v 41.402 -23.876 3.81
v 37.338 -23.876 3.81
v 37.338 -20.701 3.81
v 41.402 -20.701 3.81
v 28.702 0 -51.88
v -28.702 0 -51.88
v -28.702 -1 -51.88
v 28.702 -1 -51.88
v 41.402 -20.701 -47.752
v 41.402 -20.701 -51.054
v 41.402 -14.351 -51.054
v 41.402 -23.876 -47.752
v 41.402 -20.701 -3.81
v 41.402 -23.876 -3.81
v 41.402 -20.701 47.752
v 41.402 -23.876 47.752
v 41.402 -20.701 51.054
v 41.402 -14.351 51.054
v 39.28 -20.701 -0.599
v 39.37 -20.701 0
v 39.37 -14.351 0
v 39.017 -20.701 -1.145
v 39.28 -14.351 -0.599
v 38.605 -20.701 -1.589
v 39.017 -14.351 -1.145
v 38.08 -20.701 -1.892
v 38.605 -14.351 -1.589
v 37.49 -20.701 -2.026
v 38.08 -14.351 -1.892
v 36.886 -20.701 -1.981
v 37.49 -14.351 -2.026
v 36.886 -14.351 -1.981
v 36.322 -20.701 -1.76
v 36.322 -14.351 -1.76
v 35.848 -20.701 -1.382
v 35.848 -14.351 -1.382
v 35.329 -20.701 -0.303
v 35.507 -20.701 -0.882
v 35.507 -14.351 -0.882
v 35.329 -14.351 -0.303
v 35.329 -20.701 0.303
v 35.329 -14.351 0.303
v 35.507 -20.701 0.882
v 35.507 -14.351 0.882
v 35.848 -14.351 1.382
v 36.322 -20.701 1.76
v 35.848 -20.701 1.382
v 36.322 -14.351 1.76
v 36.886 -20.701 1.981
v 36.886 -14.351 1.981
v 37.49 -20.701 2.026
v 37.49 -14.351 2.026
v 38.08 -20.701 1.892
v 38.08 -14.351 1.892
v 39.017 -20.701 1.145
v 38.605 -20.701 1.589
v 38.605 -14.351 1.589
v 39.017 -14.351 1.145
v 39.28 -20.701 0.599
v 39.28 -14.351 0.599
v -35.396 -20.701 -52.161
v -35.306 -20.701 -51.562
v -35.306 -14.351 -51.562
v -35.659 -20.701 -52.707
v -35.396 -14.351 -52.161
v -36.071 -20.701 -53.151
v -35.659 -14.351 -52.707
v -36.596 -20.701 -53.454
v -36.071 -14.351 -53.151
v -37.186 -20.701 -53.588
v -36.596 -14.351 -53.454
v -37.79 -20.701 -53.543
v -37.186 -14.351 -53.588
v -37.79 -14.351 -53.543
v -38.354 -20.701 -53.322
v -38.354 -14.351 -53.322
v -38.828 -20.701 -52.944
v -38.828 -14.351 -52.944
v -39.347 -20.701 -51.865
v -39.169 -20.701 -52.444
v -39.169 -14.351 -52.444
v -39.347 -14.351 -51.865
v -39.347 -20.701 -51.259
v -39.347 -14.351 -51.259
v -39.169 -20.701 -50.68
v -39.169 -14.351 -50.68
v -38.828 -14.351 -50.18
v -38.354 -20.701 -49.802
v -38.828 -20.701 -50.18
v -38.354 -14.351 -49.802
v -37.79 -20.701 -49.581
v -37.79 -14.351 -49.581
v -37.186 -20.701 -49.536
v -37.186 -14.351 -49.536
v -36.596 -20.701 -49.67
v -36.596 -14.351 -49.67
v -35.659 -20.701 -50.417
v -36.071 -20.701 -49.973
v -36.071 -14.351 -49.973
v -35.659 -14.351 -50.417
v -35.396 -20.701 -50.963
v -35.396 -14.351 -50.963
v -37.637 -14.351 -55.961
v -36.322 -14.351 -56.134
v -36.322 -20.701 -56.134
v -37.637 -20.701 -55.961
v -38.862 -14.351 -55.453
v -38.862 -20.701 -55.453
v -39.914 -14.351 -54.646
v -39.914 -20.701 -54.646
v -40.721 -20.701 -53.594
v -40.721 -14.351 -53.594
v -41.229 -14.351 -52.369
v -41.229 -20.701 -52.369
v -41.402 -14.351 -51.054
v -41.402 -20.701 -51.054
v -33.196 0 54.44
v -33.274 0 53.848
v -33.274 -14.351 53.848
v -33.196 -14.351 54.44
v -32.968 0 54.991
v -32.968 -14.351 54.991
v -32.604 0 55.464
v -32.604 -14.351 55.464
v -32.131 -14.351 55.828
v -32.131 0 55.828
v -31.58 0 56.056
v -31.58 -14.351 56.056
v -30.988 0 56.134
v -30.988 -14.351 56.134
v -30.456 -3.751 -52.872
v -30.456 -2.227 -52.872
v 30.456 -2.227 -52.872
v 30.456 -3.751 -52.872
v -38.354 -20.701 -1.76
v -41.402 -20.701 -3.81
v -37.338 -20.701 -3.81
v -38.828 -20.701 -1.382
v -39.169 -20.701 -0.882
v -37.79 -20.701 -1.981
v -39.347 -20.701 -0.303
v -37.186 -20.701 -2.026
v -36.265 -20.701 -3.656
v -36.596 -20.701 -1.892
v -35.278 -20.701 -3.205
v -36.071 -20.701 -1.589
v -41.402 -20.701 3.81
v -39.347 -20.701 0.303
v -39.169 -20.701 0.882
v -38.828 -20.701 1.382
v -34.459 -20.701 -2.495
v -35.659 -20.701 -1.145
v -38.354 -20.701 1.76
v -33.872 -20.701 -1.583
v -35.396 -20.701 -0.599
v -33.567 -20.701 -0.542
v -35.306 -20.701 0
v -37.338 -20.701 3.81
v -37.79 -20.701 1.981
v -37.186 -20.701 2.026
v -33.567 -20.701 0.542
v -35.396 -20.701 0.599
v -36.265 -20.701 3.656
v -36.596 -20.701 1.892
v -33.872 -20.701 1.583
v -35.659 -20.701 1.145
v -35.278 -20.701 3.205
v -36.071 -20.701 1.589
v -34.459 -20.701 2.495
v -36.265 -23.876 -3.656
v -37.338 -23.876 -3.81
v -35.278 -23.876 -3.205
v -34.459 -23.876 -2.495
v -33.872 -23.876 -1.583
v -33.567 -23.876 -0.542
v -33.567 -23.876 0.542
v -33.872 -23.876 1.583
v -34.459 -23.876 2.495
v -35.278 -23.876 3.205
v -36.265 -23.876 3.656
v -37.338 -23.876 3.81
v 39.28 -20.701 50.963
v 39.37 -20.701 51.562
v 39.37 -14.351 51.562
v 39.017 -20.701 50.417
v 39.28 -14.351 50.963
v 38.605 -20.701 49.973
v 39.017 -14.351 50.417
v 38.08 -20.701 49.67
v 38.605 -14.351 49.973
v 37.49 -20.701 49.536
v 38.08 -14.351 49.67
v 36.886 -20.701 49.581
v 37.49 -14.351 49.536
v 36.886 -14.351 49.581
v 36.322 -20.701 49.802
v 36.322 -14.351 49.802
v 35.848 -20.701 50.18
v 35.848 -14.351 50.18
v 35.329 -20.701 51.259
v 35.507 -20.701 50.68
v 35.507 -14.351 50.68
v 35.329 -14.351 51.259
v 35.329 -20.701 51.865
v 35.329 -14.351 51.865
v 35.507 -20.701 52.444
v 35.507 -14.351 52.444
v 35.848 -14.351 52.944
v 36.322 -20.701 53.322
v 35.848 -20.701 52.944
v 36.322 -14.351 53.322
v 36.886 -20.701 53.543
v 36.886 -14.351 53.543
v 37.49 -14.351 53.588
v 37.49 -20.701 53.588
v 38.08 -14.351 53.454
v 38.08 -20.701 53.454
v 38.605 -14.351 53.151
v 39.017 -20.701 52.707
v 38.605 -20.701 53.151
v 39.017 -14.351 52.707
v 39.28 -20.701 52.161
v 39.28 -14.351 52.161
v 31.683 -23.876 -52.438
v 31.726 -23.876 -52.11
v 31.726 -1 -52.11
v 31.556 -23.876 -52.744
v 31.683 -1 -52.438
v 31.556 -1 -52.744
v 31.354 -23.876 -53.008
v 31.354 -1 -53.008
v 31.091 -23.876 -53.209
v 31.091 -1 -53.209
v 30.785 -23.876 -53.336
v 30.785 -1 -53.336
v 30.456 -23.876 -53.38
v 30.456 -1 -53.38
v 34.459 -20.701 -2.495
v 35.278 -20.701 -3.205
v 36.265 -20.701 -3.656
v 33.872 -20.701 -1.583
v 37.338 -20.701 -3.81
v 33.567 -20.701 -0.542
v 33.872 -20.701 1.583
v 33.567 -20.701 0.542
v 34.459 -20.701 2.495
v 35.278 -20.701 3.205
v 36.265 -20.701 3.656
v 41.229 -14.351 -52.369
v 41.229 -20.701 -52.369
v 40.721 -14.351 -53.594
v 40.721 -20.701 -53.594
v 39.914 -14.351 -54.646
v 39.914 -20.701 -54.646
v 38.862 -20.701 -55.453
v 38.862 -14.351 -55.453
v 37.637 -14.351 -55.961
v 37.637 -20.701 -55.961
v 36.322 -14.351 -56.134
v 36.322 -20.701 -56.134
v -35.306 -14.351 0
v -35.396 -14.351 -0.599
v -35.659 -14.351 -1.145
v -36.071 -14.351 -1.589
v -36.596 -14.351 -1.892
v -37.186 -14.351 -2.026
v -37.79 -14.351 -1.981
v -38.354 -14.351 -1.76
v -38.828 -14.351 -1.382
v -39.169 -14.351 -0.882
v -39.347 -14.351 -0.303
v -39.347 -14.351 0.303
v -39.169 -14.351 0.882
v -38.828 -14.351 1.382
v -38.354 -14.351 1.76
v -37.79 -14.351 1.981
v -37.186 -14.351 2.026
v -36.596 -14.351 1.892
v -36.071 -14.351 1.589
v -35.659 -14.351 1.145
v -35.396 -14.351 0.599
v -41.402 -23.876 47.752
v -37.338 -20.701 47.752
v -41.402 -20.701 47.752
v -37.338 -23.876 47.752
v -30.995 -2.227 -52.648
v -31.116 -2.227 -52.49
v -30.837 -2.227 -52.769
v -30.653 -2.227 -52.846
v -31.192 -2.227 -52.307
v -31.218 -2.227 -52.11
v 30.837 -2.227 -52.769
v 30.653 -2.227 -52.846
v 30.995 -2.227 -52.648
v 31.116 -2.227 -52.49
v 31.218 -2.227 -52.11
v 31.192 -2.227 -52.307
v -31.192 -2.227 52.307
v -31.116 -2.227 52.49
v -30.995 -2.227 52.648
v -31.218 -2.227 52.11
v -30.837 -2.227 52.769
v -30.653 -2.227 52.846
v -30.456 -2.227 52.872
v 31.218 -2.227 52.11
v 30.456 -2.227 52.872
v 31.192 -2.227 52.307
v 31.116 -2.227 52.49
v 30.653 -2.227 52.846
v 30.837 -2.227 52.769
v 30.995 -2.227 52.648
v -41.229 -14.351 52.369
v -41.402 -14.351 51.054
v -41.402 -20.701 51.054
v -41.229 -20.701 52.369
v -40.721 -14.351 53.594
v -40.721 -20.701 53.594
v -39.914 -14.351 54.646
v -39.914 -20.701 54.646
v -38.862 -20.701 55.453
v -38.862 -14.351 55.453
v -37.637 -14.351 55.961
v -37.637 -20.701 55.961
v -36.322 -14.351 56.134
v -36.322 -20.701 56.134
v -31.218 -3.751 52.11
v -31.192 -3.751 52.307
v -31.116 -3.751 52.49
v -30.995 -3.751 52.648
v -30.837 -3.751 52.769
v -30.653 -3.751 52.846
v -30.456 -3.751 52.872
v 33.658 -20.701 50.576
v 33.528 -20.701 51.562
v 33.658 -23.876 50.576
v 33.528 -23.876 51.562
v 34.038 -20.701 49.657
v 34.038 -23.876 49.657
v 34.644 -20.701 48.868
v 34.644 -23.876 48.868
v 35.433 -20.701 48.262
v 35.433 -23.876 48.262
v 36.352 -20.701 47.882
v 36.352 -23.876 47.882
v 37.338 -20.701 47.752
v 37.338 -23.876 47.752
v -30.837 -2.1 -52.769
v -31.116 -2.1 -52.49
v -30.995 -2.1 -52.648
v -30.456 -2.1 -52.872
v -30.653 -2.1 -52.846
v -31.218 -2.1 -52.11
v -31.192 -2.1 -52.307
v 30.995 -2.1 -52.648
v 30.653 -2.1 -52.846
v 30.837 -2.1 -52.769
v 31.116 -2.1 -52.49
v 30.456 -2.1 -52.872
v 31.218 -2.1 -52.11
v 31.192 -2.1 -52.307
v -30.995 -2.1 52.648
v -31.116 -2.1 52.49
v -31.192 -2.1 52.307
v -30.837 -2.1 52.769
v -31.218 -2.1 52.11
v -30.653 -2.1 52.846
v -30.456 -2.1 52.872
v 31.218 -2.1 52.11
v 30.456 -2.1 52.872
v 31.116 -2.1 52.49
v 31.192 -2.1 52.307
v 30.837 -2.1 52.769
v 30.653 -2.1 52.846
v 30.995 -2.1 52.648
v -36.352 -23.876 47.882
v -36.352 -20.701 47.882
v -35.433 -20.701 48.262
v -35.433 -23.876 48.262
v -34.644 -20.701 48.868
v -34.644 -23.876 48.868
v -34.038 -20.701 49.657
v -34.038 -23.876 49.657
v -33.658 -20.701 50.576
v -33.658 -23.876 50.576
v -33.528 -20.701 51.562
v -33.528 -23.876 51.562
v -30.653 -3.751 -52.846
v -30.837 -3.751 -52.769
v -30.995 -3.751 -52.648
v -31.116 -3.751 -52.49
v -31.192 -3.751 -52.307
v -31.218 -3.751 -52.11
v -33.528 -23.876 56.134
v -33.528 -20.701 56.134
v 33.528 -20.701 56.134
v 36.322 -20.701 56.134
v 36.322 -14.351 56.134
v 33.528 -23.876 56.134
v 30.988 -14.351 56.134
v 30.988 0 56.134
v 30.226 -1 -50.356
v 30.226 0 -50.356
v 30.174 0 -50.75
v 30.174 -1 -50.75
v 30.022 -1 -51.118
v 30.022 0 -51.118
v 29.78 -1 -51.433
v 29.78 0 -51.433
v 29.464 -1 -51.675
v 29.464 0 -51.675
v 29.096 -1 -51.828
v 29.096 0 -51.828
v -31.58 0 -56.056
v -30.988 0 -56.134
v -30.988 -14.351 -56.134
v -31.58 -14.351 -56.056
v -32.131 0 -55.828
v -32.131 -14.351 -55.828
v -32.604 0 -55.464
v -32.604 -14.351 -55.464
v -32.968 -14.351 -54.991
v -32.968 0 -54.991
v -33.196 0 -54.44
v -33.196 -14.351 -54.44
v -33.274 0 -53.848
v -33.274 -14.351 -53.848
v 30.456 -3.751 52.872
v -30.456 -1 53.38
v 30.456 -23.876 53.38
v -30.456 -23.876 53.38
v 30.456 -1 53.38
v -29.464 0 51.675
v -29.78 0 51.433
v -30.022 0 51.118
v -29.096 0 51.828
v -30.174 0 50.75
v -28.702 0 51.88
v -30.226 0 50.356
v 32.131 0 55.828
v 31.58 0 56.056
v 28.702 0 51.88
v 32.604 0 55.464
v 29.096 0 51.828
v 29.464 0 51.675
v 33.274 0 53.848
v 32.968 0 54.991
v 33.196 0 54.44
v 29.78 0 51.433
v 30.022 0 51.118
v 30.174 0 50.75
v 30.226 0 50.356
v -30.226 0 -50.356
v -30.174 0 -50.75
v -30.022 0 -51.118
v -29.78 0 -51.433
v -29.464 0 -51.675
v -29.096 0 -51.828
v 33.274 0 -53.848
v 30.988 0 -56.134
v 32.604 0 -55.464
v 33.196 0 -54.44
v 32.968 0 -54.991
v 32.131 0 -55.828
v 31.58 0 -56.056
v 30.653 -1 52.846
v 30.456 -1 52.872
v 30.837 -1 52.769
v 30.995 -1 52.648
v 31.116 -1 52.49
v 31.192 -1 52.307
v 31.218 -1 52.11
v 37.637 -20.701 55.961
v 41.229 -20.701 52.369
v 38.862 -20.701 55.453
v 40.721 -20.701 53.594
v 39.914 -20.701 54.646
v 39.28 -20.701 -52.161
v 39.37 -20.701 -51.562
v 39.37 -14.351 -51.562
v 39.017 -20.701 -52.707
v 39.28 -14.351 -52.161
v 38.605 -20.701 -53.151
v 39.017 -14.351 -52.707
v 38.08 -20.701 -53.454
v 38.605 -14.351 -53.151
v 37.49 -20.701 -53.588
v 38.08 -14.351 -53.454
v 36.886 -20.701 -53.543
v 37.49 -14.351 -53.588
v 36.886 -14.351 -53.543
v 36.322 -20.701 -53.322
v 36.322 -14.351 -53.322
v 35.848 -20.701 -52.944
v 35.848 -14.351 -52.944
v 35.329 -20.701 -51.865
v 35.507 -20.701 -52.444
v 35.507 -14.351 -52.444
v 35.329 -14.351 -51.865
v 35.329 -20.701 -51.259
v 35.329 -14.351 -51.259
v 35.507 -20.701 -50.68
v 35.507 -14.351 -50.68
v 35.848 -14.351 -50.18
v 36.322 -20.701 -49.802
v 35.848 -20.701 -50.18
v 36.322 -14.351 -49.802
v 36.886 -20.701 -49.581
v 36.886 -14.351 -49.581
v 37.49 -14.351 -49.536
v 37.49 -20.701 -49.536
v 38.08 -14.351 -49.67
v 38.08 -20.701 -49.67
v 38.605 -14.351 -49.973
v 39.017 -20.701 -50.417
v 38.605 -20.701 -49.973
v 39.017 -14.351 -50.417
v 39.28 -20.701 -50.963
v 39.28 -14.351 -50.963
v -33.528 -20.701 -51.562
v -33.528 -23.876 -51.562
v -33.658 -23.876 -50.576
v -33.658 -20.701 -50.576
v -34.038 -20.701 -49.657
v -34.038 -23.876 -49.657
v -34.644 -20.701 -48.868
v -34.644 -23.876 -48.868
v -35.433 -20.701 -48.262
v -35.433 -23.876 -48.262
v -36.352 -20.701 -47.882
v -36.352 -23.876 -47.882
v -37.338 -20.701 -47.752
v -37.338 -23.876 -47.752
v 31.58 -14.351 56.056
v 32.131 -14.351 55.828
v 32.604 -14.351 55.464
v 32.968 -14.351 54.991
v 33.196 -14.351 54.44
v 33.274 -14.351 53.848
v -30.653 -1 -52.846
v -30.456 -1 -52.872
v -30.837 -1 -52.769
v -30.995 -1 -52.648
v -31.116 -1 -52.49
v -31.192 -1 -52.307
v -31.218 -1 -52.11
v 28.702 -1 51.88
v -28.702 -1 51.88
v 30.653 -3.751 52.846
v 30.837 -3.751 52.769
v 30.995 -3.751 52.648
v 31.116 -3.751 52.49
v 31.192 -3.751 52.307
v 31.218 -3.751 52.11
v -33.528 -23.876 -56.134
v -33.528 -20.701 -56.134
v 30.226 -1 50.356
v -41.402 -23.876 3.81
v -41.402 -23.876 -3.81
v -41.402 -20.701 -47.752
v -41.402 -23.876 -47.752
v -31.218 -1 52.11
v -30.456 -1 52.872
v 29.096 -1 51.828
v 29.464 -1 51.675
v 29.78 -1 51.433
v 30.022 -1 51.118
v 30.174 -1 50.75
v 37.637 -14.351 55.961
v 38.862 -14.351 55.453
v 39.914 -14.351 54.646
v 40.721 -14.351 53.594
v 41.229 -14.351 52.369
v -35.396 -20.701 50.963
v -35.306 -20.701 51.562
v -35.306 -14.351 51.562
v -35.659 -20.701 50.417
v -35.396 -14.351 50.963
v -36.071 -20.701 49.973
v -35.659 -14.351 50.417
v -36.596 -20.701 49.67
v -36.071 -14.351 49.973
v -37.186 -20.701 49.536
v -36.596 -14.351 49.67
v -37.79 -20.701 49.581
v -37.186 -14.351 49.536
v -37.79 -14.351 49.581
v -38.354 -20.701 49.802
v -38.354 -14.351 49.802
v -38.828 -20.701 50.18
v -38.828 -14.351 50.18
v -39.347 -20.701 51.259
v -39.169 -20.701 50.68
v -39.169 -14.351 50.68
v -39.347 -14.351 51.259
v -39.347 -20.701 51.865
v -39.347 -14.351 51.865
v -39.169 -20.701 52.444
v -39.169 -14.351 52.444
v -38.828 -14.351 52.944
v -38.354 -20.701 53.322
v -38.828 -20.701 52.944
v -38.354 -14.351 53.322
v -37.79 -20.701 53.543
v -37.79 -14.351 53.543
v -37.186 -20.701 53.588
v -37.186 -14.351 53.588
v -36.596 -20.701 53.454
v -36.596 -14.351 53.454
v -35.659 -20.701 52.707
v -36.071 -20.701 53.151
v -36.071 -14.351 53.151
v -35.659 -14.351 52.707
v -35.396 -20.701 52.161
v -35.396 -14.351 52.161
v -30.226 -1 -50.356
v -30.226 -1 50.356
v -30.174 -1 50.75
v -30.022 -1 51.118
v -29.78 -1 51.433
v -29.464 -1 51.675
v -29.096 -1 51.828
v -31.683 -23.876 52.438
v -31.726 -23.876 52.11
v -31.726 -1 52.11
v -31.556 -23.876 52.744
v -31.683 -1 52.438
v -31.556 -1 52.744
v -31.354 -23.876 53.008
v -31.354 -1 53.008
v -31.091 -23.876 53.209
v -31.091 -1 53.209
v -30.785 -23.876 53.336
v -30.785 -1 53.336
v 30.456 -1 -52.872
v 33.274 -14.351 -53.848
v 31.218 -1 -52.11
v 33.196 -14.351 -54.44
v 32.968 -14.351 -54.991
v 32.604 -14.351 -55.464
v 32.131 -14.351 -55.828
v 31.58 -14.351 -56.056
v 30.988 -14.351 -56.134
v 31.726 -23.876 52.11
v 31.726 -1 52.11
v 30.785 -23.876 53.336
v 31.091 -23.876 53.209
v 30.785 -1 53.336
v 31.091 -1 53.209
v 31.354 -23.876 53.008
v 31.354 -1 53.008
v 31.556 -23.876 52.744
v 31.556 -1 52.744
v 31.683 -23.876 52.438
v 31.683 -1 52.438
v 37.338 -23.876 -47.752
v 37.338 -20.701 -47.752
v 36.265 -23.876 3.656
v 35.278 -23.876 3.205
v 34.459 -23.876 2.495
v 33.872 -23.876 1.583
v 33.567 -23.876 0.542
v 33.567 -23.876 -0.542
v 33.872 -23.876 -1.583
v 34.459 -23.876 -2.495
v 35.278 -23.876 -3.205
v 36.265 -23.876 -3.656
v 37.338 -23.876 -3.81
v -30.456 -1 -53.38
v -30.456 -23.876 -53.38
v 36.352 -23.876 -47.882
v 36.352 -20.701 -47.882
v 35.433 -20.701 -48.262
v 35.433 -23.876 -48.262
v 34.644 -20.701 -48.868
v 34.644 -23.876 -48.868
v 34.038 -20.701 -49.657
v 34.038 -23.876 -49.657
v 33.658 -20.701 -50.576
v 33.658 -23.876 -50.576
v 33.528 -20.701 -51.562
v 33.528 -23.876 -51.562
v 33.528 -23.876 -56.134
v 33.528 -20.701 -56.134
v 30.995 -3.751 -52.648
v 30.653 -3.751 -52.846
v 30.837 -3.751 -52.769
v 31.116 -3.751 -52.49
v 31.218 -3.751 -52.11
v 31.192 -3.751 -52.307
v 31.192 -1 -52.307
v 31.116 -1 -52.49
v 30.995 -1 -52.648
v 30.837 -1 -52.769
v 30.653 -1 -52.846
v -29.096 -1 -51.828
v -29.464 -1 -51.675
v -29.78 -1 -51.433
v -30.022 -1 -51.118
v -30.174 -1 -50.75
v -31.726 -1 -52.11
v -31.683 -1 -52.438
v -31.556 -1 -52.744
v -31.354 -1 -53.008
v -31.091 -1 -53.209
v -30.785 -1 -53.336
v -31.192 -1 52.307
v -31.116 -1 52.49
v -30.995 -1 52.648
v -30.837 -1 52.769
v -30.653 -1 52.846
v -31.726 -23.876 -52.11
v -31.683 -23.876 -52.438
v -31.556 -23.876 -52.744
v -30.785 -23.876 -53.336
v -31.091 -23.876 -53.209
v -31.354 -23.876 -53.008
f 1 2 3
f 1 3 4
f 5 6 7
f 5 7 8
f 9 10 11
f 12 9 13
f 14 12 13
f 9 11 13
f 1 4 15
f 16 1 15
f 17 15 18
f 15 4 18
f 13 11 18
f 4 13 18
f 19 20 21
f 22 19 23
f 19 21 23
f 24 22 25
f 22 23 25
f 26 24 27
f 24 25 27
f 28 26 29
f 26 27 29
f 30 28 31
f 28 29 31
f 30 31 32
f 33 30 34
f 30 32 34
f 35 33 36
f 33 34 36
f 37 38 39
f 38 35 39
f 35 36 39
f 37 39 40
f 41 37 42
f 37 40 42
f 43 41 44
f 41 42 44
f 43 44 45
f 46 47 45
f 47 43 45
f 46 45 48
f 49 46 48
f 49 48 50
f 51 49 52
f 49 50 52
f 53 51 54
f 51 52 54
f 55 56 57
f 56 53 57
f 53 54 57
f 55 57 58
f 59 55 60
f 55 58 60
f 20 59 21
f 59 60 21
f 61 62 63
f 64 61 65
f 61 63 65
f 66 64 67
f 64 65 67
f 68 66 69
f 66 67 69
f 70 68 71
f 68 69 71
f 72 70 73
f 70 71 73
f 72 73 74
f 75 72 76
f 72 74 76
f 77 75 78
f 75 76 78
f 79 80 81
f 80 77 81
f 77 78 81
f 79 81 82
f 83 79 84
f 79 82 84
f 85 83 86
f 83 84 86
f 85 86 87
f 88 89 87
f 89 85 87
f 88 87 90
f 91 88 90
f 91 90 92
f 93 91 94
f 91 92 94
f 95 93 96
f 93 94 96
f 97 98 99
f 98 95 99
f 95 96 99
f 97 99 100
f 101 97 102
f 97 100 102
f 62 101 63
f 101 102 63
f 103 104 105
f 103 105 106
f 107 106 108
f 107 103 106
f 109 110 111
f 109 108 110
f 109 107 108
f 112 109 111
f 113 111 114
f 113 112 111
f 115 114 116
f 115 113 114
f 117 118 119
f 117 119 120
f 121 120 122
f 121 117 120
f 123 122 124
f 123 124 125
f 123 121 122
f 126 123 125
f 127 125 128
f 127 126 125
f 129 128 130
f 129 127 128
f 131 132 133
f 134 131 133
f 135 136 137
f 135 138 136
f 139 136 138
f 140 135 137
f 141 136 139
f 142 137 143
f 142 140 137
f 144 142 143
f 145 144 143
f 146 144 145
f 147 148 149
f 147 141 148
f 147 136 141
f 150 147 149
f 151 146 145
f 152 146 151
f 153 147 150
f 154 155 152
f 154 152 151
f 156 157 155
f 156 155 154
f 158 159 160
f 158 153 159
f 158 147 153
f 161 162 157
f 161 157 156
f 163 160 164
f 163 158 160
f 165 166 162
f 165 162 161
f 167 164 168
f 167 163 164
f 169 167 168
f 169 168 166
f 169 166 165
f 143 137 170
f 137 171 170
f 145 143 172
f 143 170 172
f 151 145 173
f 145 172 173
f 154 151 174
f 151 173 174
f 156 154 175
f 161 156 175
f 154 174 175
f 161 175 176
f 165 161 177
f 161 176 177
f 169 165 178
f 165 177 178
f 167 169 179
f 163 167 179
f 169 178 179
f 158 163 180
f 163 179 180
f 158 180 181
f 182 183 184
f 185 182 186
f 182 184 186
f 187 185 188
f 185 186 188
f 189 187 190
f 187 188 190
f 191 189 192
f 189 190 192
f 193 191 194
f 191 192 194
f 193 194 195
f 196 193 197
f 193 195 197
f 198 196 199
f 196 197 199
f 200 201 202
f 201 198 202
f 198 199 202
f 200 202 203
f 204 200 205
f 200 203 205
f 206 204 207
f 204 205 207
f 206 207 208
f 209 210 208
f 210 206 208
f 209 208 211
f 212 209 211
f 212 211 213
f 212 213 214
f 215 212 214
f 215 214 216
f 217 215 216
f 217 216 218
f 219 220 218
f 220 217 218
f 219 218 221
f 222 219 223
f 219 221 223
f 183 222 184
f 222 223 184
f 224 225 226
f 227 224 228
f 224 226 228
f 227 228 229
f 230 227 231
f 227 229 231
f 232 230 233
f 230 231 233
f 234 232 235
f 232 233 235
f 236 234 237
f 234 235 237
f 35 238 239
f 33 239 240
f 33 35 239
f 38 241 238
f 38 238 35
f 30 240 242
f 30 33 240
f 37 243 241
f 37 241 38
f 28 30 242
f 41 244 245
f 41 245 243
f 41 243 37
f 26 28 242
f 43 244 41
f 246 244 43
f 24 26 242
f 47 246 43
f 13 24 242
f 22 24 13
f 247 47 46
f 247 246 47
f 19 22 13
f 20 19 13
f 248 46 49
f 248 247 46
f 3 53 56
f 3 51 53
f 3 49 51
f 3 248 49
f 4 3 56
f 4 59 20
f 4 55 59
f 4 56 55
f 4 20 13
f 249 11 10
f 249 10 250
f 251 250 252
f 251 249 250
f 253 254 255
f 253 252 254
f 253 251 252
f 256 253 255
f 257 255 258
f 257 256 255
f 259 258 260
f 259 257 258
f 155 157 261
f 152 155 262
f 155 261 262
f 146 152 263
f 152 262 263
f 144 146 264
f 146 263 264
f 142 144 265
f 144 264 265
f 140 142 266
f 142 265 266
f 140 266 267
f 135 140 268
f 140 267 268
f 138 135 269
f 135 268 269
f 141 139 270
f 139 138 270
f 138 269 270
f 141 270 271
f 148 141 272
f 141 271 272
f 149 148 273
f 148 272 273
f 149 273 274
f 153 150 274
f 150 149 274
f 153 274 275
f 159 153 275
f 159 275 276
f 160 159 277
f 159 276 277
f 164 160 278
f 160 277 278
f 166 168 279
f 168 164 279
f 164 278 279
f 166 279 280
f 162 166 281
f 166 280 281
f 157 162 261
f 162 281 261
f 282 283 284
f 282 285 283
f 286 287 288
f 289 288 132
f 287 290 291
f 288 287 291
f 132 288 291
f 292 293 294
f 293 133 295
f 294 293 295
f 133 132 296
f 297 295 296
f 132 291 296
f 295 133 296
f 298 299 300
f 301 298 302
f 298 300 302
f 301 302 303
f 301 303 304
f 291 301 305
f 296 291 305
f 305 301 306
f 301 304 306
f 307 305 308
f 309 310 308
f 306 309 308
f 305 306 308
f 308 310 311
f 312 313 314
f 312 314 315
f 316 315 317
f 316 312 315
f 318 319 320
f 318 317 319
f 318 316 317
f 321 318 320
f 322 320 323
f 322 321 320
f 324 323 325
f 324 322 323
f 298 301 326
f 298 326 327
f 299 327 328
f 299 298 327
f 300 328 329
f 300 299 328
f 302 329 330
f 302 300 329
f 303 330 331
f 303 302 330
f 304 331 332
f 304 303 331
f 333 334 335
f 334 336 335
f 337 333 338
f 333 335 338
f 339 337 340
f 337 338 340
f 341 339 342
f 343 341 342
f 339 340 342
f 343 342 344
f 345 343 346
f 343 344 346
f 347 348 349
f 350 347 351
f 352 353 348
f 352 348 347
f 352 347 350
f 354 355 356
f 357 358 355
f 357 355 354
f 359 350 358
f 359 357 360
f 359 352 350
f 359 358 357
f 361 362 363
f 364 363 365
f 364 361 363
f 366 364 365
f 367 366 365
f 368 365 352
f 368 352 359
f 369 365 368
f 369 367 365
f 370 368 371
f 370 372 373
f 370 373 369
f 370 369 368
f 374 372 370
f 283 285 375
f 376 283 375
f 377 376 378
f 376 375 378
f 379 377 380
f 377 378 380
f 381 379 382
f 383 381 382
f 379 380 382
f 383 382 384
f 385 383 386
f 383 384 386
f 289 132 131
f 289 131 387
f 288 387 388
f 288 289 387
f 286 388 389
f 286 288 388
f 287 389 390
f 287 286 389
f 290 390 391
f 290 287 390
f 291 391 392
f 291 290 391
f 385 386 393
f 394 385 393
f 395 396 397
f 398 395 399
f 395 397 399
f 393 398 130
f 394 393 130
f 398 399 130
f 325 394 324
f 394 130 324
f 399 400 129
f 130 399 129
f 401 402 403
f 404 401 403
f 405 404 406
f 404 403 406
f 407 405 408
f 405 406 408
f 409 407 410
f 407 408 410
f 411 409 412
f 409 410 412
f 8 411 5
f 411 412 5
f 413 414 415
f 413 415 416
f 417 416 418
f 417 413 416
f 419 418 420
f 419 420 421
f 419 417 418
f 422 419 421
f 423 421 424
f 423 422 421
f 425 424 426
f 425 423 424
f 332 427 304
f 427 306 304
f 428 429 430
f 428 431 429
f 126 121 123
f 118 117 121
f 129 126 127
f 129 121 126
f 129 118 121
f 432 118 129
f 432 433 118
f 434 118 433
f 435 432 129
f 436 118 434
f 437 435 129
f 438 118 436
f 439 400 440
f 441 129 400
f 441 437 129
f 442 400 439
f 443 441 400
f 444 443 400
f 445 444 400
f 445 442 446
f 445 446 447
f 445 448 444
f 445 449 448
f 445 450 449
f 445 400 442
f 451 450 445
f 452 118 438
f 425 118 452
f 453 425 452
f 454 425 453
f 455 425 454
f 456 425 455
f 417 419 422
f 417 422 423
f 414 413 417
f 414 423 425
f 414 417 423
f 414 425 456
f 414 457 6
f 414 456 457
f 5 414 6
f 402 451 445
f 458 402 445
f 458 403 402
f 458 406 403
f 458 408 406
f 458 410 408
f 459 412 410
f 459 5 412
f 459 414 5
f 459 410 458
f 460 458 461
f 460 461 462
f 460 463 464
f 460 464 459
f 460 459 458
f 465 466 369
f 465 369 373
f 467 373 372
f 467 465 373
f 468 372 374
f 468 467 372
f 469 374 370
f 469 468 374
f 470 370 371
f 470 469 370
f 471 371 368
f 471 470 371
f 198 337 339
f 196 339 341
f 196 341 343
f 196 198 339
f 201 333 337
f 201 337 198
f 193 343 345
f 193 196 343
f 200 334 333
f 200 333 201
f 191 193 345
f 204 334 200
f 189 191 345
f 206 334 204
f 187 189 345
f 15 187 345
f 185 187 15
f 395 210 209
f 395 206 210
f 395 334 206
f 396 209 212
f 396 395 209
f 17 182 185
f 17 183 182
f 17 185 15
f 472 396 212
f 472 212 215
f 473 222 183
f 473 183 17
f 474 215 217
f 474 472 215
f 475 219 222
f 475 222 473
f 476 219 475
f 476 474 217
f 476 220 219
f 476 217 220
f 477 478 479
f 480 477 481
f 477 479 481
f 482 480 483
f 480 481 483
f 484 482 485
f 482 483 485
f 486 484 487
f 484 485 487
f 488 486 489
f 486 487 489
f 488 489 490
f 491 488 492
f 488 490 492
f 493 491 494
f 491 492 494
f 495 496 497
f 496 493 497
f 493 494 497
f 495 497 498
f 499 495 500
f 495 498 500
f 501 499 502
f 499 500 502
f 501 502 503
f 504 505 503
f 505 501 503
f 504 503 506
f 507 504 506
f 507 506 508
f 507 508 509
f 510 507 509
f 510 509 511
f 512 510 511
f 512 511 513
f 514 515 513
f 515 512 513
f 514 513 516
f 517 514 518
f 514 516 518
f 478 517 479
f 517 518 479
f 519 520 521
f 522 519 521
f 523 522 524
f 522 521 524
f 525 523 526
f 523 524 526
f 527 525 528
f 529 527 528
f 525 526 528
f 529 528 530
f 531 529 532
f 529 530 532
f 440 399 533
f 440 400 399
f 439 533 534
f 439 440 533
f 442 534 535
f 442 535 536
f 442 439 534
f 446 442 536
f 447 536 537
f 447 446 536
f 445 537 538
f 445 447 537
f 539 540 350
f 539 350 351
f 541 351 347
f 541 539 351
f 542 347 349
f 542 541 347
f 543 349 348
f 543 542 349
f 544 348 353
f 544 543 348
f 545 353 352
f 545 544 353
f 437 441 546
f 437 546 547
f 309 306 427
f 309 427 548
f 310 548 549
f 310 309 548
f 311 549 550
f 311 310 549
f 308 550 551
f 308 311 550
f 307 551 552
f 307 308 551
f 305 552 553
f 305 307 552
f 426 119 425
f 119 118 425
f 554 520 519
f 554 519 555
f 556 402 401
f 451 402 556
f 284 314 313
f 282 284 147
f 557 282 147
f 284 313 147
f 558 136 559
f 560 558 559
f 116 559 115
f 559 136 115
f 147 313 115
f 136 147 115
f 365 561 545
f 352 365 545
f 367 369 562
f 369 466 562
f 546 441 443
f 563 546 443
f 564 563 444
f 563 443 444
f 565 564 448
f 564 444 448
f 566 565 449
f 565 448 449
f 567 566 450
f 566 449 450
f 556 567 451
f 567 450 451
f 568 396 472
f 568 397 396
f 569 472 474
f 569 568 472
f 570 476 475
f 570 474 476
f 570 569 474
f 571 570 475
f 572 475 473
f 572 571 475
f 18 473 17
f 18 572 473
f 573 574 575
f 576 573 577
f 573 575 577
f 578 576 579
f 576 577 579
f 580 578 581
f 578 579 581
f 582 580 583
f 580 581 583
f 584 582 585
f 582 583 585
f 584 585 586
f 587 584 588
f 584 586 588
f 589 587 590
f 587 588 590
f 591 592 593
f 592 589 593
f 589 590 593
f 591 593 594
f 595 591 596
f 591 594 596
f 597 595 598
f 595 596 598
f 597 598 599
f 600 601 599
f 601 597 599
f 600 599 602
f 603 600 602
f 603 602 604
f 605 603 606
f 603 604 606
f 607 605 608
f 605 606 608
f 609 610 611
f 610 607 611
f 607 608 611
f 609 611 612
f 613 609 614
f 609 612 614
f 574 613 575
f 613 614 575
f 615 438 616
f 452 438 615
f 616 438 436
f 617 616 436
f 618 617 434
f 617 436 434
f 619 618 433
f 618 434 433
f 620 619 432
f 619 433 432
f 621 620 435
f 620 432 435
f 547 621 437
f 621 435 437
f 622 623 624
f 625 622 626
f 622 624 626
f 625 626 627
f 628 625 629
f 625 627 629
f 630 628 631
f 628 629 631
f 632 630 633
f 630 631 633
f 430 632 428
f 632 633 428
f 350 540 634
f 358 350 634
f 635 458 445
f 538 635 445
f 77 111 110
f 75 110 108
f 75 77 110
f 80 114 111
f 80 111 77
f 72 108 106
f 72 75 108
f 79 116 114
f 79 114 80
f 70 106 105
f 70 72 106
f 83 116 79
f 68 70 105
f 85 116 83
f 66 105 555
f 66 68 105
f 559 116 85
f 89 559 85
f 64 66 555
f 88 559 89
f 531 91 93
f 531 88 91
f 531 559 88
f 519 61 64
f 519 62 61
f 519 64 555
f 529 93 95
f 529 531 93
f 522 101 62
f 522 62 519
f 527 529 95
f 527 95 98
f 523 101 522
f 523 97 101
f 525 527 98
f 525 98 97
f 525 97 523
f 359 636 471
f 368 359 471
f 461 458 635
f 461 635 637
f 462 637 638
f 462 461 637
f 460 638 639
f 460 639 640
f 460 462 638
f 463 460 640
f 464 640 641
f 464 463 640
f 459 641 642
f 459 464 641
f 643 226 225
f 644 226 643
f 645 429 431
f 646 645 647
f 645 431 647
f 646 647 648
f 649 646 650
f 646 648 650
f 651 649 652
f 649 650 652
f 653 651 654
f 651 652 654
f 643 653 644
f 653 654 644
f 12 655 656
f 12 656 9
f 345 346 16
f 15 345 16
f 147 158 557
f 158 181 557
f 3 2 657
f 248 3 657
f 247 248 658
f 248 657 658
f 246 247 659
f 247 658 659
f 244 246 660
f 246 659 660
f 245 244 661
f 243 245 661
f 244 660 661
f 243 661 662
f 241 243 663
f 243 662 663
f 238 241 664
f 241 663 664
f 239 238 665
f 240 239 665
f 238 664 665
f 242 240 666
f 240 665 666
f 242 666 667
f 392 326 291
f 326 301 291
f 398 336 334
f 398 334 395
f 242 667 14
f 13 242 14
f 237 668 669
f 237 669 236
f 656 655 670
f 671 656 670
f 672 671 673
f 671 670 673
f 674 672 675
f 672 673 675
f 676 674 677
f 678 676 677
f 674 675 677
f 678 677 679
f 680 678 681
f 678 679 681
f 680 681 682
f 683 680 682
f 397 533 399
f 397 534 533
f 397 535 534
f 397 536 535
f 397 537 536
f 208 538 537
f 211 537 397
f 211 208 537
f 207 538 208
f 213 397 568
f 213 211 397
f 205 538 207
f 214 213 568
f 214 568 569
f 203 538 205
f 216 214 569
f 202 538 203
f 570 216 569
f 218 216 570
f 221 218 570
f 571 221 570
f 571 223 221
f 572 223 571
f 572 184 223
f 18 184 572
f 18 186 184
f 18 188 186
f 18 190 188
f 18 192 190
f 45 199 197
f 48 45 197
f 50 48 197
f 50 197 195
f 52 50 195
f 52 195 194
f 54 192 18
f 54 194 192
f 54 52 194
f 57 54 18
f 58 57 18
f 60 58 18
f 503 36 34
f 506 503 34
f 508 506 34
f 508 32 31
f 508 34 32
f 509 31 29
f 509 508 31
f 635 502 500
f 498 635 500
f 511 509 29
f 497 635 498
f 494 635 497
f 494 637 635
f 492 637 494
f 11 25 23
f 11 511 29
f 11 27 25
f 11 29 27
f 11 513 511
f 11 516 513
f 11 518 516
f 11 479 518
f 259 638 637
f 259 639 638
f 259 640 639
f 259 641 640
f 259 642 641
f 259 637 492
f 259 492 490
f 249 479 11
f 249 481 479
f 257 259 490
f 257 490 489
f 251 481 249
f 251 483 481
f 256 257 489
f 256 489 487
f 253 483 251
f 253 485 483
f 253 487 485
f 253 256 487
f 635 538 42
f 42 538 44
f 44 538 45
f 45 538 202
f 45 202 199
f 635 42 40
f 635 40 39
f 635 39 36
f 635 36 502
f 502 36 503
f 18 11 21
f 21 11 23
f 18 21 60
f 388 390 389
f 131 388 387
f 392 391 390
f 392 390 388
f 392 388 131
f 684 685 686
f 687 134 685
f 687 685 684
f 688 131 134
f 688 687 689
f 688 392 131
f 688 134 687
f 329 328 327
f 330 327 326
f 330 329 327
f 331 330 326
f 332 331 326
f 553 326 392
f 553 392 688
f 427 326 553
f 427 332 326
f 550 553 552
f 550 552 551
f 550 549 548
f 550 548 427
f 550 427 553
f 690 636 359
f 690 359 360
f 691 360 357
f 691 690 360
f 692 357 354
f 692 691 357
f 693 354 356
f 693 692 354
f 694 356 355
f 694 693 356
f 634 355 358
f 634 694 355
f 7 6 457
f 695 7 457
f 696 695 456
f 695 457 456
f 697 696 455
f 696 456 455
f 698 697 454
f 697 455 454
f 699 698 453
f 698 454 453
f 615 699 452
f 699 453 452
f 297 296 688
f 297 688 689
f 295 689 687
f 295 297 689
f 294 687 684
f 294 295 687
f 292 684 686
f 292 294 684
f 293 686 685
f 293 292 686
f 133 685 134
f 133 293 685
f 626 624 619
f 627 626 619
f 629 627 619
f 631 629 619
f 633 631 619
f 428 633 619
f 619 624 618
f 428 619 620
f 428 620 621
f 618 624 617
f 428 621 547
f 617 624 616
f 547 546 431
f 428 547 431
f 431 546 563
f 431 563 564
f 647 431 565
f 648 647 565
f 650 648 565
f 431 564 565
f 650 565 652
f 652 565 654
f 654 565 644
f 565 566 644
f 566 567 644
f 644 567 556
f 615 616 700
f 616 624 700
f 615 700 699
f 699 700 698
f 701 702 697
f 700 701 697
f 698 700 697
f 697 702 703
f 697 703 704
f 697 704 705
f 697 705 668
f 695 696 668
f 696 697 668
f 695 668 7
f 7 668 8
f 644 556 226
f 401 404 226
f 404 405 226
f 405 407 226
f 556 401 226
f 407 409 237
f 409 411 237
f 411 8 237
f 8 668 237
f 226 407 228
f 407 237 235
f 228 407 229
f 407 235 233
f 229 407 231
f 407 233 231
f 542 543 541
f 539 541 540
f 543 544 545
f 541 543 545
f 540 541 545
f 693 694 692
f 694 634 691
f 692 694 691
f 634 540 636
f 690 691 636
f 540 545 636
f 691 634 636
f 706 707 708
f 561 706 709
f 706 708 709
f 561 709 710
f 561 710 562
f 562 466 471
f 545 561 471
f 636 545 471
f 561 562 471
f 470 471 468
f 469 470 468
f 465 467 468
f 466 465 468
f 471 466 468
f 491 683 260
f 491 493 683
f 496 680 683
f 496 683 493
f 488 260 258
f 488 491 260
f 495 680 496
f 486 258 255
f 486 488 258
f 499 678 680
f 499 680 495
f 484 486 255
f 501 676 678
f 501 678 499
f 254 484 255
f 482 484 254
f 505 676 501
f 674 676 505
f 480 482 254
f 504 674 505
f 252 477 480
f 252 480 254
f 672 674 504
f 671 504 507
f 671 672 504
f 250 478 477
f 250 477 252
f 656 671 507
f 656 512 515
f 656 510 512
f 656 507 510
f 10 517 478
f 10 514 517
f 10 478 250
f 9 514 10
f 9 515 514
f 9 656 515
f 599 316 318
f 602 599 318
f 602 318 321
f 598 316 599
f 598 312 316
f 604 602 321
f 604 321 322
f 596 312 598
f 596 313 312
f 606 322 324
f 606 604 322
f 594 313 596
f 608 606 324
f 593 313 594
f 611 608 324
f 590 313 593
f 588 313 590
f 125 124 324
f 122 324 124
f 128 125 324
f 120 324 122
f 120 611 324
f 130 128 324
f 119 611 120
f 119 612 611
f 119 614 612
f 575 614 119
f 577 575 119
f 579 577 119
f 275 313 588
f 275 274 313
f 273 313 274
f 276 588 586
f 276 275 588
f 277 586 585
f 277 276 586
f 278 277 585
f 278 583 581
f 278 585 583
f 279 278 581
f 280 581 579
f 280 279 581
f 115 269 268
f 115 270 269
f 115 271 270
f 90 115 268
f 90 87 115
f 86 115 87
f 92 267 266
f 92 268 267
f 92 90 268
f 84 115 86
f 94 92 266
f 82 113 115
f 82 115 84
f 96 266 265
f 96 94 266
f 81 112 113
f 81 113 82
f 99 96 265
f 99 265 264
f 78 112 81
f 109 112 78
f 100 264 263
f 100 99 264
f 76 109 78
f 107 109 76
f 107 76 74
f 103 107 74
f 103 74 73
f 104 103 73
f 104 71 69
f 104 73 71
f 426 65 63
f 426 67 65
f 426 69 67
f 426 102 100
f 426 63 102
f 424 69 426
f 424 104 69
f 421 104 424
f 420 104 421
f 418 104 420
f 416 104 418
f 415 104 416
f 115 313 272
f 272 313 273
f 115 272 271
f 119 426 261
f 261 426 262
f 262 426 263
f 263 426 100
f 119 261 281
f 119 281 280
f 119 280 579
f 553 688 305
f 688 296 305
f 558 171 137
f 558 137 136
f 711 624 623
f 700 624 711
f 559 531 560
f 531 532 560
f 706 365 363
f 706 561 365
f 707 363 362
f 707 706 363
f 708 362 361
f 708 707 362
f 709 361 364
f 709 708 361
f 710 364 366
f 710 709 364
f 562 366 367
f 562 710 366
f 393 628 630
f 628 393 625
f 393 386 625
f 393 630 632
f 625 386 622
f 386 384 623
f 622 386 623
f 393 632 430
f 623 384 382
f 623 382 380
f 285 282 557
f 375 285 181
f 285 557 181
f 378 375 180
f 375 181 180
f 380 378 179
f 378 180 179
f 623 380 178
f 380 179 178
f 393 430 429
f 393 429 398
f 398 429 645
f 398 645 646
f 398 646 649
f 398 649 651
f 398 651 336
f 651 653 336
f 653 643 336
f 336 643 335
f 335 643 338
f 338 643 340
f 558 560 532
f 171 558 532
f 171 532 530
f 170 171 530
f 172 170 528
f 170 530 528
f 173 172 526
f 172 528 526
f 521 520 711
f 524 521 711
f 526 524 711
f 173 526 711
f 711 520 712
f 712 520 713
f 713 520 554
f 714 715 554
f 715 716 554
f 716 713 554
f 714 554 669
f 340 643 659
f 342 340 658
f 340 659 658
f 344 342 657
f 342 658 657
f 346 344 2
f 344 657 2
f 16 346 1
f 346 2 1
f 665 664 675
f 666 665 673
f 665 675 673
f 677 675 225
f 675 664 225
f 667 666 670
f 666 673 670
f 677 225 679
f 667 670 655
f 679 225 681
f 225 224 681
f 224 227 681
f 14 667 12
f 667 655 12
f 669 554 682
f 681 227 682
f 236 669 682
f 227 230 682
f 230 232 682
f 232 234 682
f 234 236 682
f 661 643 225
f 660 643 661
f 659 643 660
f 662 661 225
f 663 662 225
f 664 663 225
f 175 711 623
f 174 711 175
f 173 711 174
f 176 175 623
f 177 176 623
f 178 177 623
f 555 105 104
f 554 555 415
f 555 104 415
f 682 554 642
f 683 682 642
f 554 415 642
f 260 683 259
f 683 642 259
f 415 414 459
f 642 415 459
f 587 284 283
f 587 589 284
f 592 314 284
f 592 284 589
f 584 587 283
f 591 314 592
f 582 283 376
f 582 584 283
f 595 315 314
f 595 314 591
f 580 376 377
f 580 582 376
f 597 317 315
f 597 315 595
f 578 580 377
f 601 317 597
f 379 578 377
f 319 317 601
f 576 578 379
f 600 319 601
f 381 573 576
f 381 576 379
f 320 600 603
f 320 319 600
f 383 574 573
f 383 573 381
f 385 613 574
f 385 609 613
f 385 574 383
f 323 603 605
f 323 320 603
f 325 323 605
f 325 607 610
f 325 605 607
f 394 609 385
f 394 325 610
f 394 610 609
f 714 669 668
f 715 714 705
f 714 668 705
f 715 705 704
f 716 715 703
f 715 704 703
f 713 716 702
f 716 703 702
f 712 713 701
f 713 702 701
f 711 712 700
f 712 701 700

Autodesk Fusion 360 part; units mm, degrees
sketch "Sketch1" plane through (0, 0, 0) normal (0, 1, 0) x (1, 0, 0)
  line L0 (-36.322, 56.134) -> (36.322, 56.134)
  line L1 (41.402, 51.054) -> (41.402, -51.054)
  line L2 (36.322, -56.134) -> (-36.322, -56.134)
  line L3 (-41.402, -51.054) -> (-41.402, 51.054)
  line L4 (-41.402, 56.134) -> (41.402, -56.134) construction
  line L5 (41.402, 56.134) -> (-41.402, -56.134) construction
  arc A0 (-36.322, 56.134) -> (-41.402, 51.054) centre (-36.322, 51.054) ccw
  arc A1 (41.402, 51.054) -> (36.322, 56.134) centre (36.322, 51.054) ccw
  arc A2 (36.322, -56.134) -> (41.402, -51.054) centre (36.322, -51.054) ccw
  arc A3 (-41.402, -51.054) -> (-36.322, -56.134) centre (-36.322, -51.054) ccw
  line L6 (-30.988, 56.134) -> (30.988, 56.134)
  line L7 (33.274, 53.848) -> (33.274, -53.848)
  line L8 (30.988, -56.134) -> (-30.988, -56.134)
  line L9 (-33.274, -53.848) -> (-33.274, 53.848)
  line L10 (-33.274, 56.134) -> (33.274, -56.134) construction
  line L11 (33.274, 56.134) -> (-33.274, -56.134) construction
  arc A4 (-30.988, 56.134) -> (-33.274, 53.848) centre (-30.988, 53.848) ccw
  arc A5 (33.274, 53.848) -> (30.988, 56.134) centre (30.988, 53.848) ccw
  arc A6 (30.988, -56.134) -> (33.274, -53.848) centre (30.988, -53.848) ccw
  arc A7 (-33.274, -53.848) -> (-30.988, -56.134) centre (-30.988, -53.848) ccw
  line L12 (-28.702, 51.8795) -> (28.702, 51.8795)
  line L13 (30.226, 50.3555) -> (30.226, -50.3555)
  line L14 (28.702, -51.8795) -> (-28.702, -51.8795)
  line L15 (-30.226, -50.3555) -> (-30.226, 50.3555)
  line L16 (-30.226, 51.8795) -> (30.226, -51.8795) construction
  line L17 (30.226, 51.8795) -> (-30.226, -51.8795) construction
  arc A8 (-28.702, 51.8795) -> (-30.226, 50.3555) centre (-28.702, 50.3555) ccw
  arc A9 (30.226, 50.3555) -> (28.702, 51.8795) centre (28.702, 50.3555) ccw
  arc A10 (28.702, -51.8795) -> (30.226, -50.3555) centre (28.702, -50.3555) ccw
  arc A11 (-30.226, -50.3555) -> (-28.702, -51.8795) centre (-28.702, -50.3555) ccw
  line L18 (-30.456, 53.3795) -> (30.456, 53.3795)
  line L19 (31.726, 52.1095) -> (31.726, -52.1095)
  line L20 (30.456, -53.3795) -> (-30.456, -53.3795)
  line L21 (-31.726, -52.1095) -> (-31.726, 52.1095)
  line L22 (-31.726, 53.3795) -> (31.726, -53.3795) construction
  line L23 (31.726, 53.3795) -> (-31.726, -53.3795) construction
  arc A12 (-30.456, 53.3795) -> (-31.726, 52.1095) centre (-30.456, 52.1095) ccw
  arc A13 (31.726, 52.1095) -> (30.456, 53.3795) centre (30.456, 52.1095) ccw
  arc A14 (30.456, -53.3795) -> (31.726, -52.1095) centre (30.456, -52.1095) ccw
  arc A15 (-31.726, -52.1095) -> (-30.456, -53.3795) centre (-30.456, -52.1095) ccw
  line L24 (37.338, 51.562) -> (-37.338, 51.562) construction
  line L25 (-37.338, 51.562) -> (-37.338, -51.562) construction
  line L26 (-37.338, -51.562) -> (37.338, -51.562) construction
  line L27 (37.338, -51.562) -> (37.338, 51.562) construction
  line L28 (37.338, 51.562) -> (-37.338, -51.562) construction
  line L29 (-37.338, 51.562) -> (37.338, -51.562) construction
  circle A16 centre (-37.338, 51.562) radius 2.032
  circle A17 centre (37.338, 51.562) radius 2.032
  circle A18 centre (37.338, 0) radius 2.032
  circle A19 centre (37.338, -51.562) radius 2.032
  circle A20 centre (-37.338, -51.562) radius 2.032
  circle A21 centre (-37.338, 0) radius 2.032
  dimension "d1" = 82.804
  dimension "d2" = 112.268
  dimension "d3" = 5.08
  dimension "d4" = 66.548
  dimension "d5" = 2.286
  dimension "d6" = 60.452
  dimension "d7" = 103.759
  dimension "d8" = 1.524
  dimension "d15" = 1.5
  dimension "d16" = 1.5
  dimension "d17" = 1.27
  dimension "d21" = 4.064
  dimension "d22" = 74.676
  dimension "d23" = 103.124
extrude "Extrude1" add sketch "Sketch1" against normal blind 23.876 contours L0 L2 L3 A0 A3 L9 A4 A7 | L0 L2 L6 L7 L8 L9 A4 A5 A6 A7 | L0 L1 L2 A1 A2 L7 A5 A6 | L12 L13 L14 L15 A8 A9 A10 A11 | L18 L19 L20 L21 A12 A13 A14 A15 | A16 | A17 | A18 | A19 | A20 | A21 makes body 1
extrude "Extrude2" cut sketch "Sketch1" against normal blind 14.351 contours L0 L2 L3 A0 A3 L9 A4 A7 | L0 L1 L2 A1 A2 L7 A5 A6 | A16 | A17 | A18 | A19 | A20 | A21 bodies 1
extrude "Extrude3" cut sketch "Sketch1" against normal blind 70 contours L12 L13 L14 L15 A8 A9 A10 A11 bodies 1
extrude "Extrude4" cut sketch "Sketch1" against normal blind 40 from surface at -1 contours L18 L19 L20 L21 A12 A13 A14 A15 bodies 1
extrude "Extrude5" cut sketch "Sketch1" against normal blind 80 contours A16 | A17 | A18 | A19 | A20 | A21 bodies 1
sketch "Sketch2" plane through (0, -23.876, 0) normal (0, -1, 0) x (1, 0, 0)
  circle A0 centre (37.338, 51.562) radius 2.032
  circle A1 centre (-37.338, -51.562) radius 2.032
  circle A2 centre (37.338, 0) radius 2.032
  circle A3 centre (-37.338, 51.562) radius 2.032
  circle A4 centre (-37.338, 0) radius 2.032
  circle A5 centre (37.338, -51.562) radius 2.032
  line L0 (-31.726, -52.1095) -> (-31.726, 52.1095)
  arc A6 (-30.456, 53.3795) -> (-31.726, 52.1095) centre (-30.456, 52.1095) ccw
  line L1 (-30.456, 53.3795) -> (30.456, 53.3795)
  arc A7 (31.726, 52.1095) -> (30.456, 53.3795) centre (30.456, 52.1095) ccw
  line L2 (31.726, 52.1095) -> (31.726, -52.1095)
  arc A8 (30.456, -53.3795) -> (31.726, -52.1095) centre (30.456, -52.1095) ccw
  line L3 (30.456, -53.3795) -> (-30.456, -53.3795)
  arc A9 (-31.726, -52.1095) -> (-30.456, -53.3795) centre (-30.456, -52.1095) ccw
  arc A10 (41.402, 51.054) -> (36.322, 56.134) centre (36.322, 51.054) ccw
  line L4 (36.322, 56.134) -> (-36.322, 56.134)
  arc A11 (-36.322, 56.134) -> (-41.402, 51.054) centre (-36.322, 51.054) ccw
  line L5 (-41.402, 51.054) -> (-41.402, -51.054)
  arc A12 (-41.402, -51.054) -> (-36.322, -56.134) centre (-36.322, -51.054) ccw
  line L6 (-36.322, -56.134) -> (36.322, -56.134)
  arc A13 (36.322, -56.134) -> (41.402, -51.054) centre (36.322, -51.054) ccw
  line L7 (41.402, -51.054) -> (41.402, 51.054)
  line L8 (-33.528, 51.562) -> (-33.528, 57.6053)
  line L9 (-33.528, 57.6053) -> (-43.8706, 57.6053)
  line L10 (-37.338, 47.752) -> (-43.8706, 47.752)
  line L11 (-43.8706, 47.752) -> (-43.8706, 57.6053)
  arc A14 (-37.338, 47.752) -> (-33.528, 51.562) centre (-37.338, 51.562) ccw
  line L12 (-37.338, 3.81) -> (-44.0815, 3.81)
  line L13 (-44.0815, 3.81) -> (-44.0815, -3.81)
  line L14 (-37.338, -3.81) -> (-44.0815, -3.81)
  arc A15 (-37.338, -3.81) -> (-37.338, 3.81) centre (-37.338, 0) ccw
  line L15 (-37.338, -47.752) -> (-43.7202, -47.752)
  line L16 (-43.7202, -47.752) -> (-43.7202, -57.2057)
  line L17 (-33.528, -51.562) -> (-33.528, -57.2057)
  line L18 (-33.528, -57.2057) -> (-43.7202, -57.2057)
  arc A16 (-33.528, -51.562) -> (-37.338, -47.752) centre (-37.338, -51.562) ccw
  line L19 (0, 0) -> (0, 74.1902) construction
  line L20 (33.528, 57.6053) -> (43.8706, 57.6053)
  line L21 (43.8706, 47.752) -> (43.8706, 57.6053)
  line L22 (37.338, 47.752) -> (43.8706, 47.752)
  arc A17 (33.528, 51.562) -> (37.338, 47.752) centre (37.338, 51.562) ccw
  line L23 (33.528, 51.562) -> (33.528, 57.6053)
  arc A18 (37.338, 3.81) -> (37.338, -3.81) centre (37.338, 0) ccw
  line L24 (37.338, 3.81) -> (44.0815, 3.81)
  line L25 (44.0815, 3.81) -> (44.0815, -3.81)
  line L26 (37.338, -3.81) -> (44.0815, -3.81)
  line L27 (43.7202, -47.752) -> (43.7202, -57.2057)
  line L28 (33.528, -57.2057) -> (43.7202, -57.2057)
  line L29 (33.528, -51.562) -> (33.528, -57.2057)
  arc A19 (37.338, -47.752) -> (33.528, -51.562) centre (37.338, -51.562) ccw
  line L30 (37.338, -47.752) -> (43.7202, -47.752)
  dimension "d26" = 3.81
extrude "Extrude6" cut sketch "Sketch2" against normal blind 3.175 contours A10 L4 L7 L22 A17 L23 | L7 A18 L24 L26 | L4 A11 L5 L8 L10 A14 | L6 A13 L7 L29 A19 L30 | L5 L12 L14 A15 | L5 A12 L6 L15 L17 A16 bodies 1
sketch "Sketch3" plane through (0, -1, 0) normal (0, -1, 0) x (1, 0, 0)
  arc A0 (-30.226, -50.3555) -> (-28.702, -51.8795) centre (-28.702, -50.3555) ccw
  line L0 (-30.226, -50.3555) -> (-30.226, 50.3555)
  arc A1 (-28.702, 51.8795) -> (-30.226, 50.3555) centre (-28.702, 50.3555) ccw
  line L1 (-28.702, 51.8795) -> (28.702, 51.8795)
  arc A2 (30.226, 50.3555) -> (28.702, 51.8795) centre (28.702, 50.3555) ccw
  line L2 (30.226, 50.3555) -> (30.226, -50.3555)
  arc A3 (28.702, -51.8795) -> (30.226, -50.3555) centre (28.702, -50.3555) ccw
  line L3 (28.702, -51.8795) -> (-28.702, -51.8795)
  arc A4 (-31.726, -52.1095) -> (-30.456, -53.3795) centre (-30.456, -52.1095) ccw
  line L4 (-30.456, -53.3795) -> (30.456, -53.3795)
  arc A5 (30.456, -53.3795) -> (31.726, -52.1095) centre (30.456, -52.1095) ccw
  line L5 (31.726, -52.1095) -> (31.726, 52.1095)
  arc A6 (31.726, 52.1095) -> (30.456, 53.3795) centre (30.456, 52.1095) ccw
  line L6 (30.456, 53.3795) -> (-30.456, 53.3795)
  arc A7 (-30.456, 53.3795) -> (-31.726, 52.1095) centre (-30.456, 52.1095) ccw
  line L7 (-31.726, 52.1095) -> (-31.726, -52.1095)
  arc A8 (-31.218, -52.1095) -> (-30.456, -52.8715) centre (-30.456, -52.1095) ccw
  line L8 (-30.456, -52.8715) -> (30.456, -52.8715)
  arc A9 (30.456, -52.8715) -> (31.218, -52.1095) centre (30.456, -52.1095) ccw
  line L9 (31.218, -52.1095) -> (31.218, 52.1095)
  arc A10 (31.218, 52.1095) -> (30.456, 52.8715) centre (30.456, 52.1095) ccw
  line L10 (30.456, 52.8715) -> (-30.456, 52.8715)
  arc A11 (-30.456, 52.8715) -> (-31.218, 52.1095) centre (-30.456, 52.1095) ccw
  line L11 (-31.218, 52.1095) -> (-31.218, -52.1095)
  dimension "d29" = 0.508
extrude "Extrude7" add sketch "Sketch3" along normal blind 1.1 separate body contours A0 L0 A1 L1 A2 L2 A3 L3 | A8 L8 A9 L9 A10 L10 A11 L11 makes body 2
sketch "Sketch4" plane through (0, -2.1, 0) normal (0, -1, 0) x (1, 0, 0)
  line L0 (-31.218, 52.1095) -> (-31.218, -52.1095)
  arc A0 (-31.218, -52.1095) -> (-30.456, -52.8715) centre (-30.456, -52.1095) ccw
  line L1 (-30.456, -52.8715) -> (30.456, -52.8715)
  arc A1 (30.456, -52.8715) -> (31.218, -52.1095) centre (30.456, -52.1095) ccw
  line L2 (31.218, -52.1095) -> (31.218, 52.1095)
  arc A2 (31.218, 52.1095) -> (30.456, 52.8715) centre (30.456, 52.1095) ccw
  line L3 (30.456, 52.8715) -> (-30.456, 52.8715)
  arc A3 (-30.456, 52.8715) -> (-31.218, 52.1095) centre (-30.456, 52.1095) ccw
  line L4 (-30.456, -52.8715) -> (30.456, -52.8715)
  arc A4 (30.456, -52.8715) -> (31.218, -52.1095) centre (30.456, -52.1095) ccw
  line L5 (31.218, -52.1095) -> (31.218, 52.1095)
  arc A5 (31.218, 52.1095) -> (30.456, 52.8715) centre (30.456, 52.1095) ccw
  line L6 (30.456, 52.8715) -> (-30.456, 52.8715)
  arc A6 (-30.456, 52.8715) -> (-31.218, 52.1095) centre (-30.456, 52.1095) ccw
  line L7 (-31.218, 52.1095) -> (-31.218, -52.1095)
  arc A7 (-31.218, -52.1095) -> (-30.456, -52.8715) centre (-30.456, -52.1095) ccw
  dimension "d32" = 0
extrude "Extrude8" add sketch "Sketch4" along normal blind 1.524 from surface at 0.127 separate body makes body 3
